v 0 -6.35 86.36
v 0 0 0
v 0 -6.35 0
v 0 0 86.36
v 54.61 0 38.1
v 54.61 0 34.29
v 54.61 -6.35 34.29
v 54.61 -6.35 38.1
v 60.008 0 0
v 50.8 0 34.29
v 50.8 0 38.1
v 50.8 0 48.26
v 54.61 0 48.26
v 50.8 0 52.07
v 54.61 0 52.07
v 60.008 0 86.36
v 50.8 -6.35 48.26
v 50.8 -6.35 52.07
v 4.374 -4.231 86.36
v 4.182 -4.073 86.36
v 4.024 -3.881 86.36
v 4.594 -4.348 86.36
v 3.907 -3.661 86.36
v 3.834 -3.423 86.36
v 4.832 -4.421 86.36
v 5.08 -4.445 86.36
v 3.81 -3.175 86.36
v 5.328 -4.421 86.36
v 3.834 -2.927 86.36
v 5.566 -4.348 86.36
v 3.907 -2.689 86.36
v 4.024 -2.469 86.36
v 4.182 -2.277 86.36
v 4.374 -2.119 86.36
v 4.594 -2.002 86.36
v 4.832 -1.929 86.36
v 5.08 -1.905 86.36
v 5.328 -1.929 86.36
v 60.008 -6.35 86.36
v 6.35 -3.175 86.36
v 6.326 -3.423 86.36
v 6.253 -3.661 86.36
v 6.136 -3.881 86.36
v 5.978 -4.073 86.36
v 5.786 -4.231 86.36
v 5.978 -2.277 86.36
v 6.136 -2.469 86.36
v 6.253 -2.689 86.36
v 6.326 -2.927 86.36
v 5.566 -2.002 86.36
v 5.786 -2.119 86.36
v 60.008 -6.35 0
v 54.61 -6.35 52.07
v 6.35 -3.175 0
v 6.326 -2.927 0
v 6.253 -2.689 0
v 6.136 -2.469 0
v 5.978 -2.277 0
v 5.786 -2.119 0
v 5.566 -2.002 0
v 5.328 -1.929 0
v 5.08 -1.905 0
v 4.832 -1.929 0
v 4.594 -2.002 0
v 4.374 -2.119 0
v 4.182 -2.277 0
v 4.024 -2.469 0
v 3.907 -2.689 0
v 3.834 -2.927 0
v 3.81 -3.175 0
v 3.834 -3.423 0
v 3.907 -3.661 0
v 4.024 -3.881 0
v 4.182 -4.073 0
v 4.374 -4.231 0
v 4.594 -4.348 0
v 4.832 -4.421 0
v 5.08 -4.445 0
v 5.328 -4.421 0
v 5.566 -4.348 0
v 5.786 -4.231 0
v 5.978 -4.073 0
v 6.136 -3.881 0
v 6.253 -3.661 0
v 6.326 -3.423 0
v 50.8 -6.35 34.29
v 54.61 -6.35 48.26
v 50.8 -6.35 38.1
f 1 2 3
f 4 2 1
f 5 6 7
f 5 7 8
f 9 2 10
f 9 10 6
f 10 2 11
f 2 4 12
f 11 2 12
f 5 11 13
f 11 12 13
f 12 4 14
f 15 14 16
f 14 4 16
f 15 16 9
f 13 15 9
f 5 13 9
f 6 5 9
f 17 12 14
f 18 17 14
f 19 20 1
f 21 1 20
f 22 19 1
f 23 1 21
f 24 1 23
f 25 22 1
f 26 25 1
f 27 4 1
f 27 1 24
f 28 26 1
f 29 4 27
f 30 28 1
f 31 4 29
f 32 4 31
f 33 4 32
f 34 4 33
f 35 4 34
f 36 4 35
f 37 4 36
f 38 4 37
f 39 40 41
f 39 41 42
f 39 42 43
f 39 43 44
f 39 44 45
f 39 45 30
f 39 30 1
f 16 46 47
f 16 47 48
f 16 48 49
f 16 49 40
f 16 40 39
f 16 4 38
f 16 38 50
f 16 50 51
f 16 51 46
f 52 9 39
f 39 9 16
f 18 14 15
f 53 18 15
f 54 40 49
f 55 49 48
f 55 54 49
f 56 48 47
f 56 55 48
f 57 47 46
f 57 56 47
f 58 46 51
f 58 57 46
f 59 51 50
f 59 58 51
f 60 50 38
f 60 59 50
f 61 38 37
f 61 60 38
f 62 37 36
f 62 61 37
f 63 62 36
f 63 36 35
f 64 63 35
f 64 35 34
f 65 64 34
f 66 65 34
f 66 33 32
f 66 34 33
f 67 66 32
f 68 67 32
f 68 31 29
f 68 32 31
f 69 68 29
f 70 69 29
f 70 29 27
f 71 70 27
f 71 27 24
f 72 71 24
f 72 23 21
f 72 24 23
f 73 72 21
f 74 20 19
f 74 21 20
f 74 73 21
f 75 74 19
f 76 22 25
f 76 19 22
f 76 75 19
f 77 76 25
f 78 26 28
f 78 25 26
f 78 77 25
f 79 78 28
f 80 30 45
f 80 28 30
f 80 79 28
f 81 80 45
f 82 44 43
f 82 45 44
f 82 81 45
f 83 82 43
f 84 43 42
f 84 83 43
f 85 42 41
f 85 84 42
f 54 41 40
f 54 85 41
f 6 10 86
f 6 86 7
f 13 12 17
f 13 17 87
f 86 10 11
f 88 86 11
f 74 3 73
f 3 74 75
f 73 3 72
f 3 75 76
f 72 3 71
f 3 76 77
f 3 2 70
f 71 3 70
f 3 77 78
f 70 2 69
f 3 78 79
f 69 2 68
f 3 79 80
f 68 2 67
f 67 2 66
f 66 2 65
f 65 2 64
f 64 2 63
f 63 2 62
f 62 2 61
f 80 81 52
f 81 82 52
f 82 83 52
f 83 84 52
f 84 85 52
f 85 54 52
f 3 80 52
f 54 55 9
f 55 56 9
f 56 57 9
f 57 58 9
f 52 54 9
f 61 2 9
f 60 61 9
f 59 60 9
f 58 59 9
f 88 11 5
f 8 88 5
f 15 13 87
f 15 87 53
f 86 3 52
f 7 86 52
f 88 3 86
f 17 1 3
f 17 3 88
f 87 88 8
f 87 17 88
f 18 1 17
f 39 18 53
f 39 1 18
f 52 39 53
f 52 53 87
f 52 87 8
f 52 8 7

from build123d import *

# Parameters (mm, degrees)
F0_W     = 60.0075
F0_H     = 86.36
F0_W_2   = 3.81
F0_H_2   = 3.81
F1_DEPTH = 6.35
F2_R     = 1.27
F3_DEPTH = 86.361


with BuildPart() as f1:
    # F0 (on Front) → F1 (new body)
    with BuildSketch(Plane.XZ):
        with Locations((30.00375, 43.18)):
            Rectangle(F0_W, F0_H)
        with Locations((52.705, 36.195)):
            Rectangle(F0_W_2, F0_H_2, mode=Mode.SUBTRACT)
        with Locations((52.705, 50.165)):
            Rectangle(F0_W_2, F0_H_2, mode=Mode.SUBTRACT)
    extrude(amount=F1_DEPTH)

    # F2 (on Top) → F3 (cut, through all)
    with BuildSketch(Plane.XY):
        with Locations((5.08, -3.175)):
            Circle(F2_R)
    extrude(amount=F3_DEPTH, mode=Mode.SUBTRACT)


solid = f1.part
